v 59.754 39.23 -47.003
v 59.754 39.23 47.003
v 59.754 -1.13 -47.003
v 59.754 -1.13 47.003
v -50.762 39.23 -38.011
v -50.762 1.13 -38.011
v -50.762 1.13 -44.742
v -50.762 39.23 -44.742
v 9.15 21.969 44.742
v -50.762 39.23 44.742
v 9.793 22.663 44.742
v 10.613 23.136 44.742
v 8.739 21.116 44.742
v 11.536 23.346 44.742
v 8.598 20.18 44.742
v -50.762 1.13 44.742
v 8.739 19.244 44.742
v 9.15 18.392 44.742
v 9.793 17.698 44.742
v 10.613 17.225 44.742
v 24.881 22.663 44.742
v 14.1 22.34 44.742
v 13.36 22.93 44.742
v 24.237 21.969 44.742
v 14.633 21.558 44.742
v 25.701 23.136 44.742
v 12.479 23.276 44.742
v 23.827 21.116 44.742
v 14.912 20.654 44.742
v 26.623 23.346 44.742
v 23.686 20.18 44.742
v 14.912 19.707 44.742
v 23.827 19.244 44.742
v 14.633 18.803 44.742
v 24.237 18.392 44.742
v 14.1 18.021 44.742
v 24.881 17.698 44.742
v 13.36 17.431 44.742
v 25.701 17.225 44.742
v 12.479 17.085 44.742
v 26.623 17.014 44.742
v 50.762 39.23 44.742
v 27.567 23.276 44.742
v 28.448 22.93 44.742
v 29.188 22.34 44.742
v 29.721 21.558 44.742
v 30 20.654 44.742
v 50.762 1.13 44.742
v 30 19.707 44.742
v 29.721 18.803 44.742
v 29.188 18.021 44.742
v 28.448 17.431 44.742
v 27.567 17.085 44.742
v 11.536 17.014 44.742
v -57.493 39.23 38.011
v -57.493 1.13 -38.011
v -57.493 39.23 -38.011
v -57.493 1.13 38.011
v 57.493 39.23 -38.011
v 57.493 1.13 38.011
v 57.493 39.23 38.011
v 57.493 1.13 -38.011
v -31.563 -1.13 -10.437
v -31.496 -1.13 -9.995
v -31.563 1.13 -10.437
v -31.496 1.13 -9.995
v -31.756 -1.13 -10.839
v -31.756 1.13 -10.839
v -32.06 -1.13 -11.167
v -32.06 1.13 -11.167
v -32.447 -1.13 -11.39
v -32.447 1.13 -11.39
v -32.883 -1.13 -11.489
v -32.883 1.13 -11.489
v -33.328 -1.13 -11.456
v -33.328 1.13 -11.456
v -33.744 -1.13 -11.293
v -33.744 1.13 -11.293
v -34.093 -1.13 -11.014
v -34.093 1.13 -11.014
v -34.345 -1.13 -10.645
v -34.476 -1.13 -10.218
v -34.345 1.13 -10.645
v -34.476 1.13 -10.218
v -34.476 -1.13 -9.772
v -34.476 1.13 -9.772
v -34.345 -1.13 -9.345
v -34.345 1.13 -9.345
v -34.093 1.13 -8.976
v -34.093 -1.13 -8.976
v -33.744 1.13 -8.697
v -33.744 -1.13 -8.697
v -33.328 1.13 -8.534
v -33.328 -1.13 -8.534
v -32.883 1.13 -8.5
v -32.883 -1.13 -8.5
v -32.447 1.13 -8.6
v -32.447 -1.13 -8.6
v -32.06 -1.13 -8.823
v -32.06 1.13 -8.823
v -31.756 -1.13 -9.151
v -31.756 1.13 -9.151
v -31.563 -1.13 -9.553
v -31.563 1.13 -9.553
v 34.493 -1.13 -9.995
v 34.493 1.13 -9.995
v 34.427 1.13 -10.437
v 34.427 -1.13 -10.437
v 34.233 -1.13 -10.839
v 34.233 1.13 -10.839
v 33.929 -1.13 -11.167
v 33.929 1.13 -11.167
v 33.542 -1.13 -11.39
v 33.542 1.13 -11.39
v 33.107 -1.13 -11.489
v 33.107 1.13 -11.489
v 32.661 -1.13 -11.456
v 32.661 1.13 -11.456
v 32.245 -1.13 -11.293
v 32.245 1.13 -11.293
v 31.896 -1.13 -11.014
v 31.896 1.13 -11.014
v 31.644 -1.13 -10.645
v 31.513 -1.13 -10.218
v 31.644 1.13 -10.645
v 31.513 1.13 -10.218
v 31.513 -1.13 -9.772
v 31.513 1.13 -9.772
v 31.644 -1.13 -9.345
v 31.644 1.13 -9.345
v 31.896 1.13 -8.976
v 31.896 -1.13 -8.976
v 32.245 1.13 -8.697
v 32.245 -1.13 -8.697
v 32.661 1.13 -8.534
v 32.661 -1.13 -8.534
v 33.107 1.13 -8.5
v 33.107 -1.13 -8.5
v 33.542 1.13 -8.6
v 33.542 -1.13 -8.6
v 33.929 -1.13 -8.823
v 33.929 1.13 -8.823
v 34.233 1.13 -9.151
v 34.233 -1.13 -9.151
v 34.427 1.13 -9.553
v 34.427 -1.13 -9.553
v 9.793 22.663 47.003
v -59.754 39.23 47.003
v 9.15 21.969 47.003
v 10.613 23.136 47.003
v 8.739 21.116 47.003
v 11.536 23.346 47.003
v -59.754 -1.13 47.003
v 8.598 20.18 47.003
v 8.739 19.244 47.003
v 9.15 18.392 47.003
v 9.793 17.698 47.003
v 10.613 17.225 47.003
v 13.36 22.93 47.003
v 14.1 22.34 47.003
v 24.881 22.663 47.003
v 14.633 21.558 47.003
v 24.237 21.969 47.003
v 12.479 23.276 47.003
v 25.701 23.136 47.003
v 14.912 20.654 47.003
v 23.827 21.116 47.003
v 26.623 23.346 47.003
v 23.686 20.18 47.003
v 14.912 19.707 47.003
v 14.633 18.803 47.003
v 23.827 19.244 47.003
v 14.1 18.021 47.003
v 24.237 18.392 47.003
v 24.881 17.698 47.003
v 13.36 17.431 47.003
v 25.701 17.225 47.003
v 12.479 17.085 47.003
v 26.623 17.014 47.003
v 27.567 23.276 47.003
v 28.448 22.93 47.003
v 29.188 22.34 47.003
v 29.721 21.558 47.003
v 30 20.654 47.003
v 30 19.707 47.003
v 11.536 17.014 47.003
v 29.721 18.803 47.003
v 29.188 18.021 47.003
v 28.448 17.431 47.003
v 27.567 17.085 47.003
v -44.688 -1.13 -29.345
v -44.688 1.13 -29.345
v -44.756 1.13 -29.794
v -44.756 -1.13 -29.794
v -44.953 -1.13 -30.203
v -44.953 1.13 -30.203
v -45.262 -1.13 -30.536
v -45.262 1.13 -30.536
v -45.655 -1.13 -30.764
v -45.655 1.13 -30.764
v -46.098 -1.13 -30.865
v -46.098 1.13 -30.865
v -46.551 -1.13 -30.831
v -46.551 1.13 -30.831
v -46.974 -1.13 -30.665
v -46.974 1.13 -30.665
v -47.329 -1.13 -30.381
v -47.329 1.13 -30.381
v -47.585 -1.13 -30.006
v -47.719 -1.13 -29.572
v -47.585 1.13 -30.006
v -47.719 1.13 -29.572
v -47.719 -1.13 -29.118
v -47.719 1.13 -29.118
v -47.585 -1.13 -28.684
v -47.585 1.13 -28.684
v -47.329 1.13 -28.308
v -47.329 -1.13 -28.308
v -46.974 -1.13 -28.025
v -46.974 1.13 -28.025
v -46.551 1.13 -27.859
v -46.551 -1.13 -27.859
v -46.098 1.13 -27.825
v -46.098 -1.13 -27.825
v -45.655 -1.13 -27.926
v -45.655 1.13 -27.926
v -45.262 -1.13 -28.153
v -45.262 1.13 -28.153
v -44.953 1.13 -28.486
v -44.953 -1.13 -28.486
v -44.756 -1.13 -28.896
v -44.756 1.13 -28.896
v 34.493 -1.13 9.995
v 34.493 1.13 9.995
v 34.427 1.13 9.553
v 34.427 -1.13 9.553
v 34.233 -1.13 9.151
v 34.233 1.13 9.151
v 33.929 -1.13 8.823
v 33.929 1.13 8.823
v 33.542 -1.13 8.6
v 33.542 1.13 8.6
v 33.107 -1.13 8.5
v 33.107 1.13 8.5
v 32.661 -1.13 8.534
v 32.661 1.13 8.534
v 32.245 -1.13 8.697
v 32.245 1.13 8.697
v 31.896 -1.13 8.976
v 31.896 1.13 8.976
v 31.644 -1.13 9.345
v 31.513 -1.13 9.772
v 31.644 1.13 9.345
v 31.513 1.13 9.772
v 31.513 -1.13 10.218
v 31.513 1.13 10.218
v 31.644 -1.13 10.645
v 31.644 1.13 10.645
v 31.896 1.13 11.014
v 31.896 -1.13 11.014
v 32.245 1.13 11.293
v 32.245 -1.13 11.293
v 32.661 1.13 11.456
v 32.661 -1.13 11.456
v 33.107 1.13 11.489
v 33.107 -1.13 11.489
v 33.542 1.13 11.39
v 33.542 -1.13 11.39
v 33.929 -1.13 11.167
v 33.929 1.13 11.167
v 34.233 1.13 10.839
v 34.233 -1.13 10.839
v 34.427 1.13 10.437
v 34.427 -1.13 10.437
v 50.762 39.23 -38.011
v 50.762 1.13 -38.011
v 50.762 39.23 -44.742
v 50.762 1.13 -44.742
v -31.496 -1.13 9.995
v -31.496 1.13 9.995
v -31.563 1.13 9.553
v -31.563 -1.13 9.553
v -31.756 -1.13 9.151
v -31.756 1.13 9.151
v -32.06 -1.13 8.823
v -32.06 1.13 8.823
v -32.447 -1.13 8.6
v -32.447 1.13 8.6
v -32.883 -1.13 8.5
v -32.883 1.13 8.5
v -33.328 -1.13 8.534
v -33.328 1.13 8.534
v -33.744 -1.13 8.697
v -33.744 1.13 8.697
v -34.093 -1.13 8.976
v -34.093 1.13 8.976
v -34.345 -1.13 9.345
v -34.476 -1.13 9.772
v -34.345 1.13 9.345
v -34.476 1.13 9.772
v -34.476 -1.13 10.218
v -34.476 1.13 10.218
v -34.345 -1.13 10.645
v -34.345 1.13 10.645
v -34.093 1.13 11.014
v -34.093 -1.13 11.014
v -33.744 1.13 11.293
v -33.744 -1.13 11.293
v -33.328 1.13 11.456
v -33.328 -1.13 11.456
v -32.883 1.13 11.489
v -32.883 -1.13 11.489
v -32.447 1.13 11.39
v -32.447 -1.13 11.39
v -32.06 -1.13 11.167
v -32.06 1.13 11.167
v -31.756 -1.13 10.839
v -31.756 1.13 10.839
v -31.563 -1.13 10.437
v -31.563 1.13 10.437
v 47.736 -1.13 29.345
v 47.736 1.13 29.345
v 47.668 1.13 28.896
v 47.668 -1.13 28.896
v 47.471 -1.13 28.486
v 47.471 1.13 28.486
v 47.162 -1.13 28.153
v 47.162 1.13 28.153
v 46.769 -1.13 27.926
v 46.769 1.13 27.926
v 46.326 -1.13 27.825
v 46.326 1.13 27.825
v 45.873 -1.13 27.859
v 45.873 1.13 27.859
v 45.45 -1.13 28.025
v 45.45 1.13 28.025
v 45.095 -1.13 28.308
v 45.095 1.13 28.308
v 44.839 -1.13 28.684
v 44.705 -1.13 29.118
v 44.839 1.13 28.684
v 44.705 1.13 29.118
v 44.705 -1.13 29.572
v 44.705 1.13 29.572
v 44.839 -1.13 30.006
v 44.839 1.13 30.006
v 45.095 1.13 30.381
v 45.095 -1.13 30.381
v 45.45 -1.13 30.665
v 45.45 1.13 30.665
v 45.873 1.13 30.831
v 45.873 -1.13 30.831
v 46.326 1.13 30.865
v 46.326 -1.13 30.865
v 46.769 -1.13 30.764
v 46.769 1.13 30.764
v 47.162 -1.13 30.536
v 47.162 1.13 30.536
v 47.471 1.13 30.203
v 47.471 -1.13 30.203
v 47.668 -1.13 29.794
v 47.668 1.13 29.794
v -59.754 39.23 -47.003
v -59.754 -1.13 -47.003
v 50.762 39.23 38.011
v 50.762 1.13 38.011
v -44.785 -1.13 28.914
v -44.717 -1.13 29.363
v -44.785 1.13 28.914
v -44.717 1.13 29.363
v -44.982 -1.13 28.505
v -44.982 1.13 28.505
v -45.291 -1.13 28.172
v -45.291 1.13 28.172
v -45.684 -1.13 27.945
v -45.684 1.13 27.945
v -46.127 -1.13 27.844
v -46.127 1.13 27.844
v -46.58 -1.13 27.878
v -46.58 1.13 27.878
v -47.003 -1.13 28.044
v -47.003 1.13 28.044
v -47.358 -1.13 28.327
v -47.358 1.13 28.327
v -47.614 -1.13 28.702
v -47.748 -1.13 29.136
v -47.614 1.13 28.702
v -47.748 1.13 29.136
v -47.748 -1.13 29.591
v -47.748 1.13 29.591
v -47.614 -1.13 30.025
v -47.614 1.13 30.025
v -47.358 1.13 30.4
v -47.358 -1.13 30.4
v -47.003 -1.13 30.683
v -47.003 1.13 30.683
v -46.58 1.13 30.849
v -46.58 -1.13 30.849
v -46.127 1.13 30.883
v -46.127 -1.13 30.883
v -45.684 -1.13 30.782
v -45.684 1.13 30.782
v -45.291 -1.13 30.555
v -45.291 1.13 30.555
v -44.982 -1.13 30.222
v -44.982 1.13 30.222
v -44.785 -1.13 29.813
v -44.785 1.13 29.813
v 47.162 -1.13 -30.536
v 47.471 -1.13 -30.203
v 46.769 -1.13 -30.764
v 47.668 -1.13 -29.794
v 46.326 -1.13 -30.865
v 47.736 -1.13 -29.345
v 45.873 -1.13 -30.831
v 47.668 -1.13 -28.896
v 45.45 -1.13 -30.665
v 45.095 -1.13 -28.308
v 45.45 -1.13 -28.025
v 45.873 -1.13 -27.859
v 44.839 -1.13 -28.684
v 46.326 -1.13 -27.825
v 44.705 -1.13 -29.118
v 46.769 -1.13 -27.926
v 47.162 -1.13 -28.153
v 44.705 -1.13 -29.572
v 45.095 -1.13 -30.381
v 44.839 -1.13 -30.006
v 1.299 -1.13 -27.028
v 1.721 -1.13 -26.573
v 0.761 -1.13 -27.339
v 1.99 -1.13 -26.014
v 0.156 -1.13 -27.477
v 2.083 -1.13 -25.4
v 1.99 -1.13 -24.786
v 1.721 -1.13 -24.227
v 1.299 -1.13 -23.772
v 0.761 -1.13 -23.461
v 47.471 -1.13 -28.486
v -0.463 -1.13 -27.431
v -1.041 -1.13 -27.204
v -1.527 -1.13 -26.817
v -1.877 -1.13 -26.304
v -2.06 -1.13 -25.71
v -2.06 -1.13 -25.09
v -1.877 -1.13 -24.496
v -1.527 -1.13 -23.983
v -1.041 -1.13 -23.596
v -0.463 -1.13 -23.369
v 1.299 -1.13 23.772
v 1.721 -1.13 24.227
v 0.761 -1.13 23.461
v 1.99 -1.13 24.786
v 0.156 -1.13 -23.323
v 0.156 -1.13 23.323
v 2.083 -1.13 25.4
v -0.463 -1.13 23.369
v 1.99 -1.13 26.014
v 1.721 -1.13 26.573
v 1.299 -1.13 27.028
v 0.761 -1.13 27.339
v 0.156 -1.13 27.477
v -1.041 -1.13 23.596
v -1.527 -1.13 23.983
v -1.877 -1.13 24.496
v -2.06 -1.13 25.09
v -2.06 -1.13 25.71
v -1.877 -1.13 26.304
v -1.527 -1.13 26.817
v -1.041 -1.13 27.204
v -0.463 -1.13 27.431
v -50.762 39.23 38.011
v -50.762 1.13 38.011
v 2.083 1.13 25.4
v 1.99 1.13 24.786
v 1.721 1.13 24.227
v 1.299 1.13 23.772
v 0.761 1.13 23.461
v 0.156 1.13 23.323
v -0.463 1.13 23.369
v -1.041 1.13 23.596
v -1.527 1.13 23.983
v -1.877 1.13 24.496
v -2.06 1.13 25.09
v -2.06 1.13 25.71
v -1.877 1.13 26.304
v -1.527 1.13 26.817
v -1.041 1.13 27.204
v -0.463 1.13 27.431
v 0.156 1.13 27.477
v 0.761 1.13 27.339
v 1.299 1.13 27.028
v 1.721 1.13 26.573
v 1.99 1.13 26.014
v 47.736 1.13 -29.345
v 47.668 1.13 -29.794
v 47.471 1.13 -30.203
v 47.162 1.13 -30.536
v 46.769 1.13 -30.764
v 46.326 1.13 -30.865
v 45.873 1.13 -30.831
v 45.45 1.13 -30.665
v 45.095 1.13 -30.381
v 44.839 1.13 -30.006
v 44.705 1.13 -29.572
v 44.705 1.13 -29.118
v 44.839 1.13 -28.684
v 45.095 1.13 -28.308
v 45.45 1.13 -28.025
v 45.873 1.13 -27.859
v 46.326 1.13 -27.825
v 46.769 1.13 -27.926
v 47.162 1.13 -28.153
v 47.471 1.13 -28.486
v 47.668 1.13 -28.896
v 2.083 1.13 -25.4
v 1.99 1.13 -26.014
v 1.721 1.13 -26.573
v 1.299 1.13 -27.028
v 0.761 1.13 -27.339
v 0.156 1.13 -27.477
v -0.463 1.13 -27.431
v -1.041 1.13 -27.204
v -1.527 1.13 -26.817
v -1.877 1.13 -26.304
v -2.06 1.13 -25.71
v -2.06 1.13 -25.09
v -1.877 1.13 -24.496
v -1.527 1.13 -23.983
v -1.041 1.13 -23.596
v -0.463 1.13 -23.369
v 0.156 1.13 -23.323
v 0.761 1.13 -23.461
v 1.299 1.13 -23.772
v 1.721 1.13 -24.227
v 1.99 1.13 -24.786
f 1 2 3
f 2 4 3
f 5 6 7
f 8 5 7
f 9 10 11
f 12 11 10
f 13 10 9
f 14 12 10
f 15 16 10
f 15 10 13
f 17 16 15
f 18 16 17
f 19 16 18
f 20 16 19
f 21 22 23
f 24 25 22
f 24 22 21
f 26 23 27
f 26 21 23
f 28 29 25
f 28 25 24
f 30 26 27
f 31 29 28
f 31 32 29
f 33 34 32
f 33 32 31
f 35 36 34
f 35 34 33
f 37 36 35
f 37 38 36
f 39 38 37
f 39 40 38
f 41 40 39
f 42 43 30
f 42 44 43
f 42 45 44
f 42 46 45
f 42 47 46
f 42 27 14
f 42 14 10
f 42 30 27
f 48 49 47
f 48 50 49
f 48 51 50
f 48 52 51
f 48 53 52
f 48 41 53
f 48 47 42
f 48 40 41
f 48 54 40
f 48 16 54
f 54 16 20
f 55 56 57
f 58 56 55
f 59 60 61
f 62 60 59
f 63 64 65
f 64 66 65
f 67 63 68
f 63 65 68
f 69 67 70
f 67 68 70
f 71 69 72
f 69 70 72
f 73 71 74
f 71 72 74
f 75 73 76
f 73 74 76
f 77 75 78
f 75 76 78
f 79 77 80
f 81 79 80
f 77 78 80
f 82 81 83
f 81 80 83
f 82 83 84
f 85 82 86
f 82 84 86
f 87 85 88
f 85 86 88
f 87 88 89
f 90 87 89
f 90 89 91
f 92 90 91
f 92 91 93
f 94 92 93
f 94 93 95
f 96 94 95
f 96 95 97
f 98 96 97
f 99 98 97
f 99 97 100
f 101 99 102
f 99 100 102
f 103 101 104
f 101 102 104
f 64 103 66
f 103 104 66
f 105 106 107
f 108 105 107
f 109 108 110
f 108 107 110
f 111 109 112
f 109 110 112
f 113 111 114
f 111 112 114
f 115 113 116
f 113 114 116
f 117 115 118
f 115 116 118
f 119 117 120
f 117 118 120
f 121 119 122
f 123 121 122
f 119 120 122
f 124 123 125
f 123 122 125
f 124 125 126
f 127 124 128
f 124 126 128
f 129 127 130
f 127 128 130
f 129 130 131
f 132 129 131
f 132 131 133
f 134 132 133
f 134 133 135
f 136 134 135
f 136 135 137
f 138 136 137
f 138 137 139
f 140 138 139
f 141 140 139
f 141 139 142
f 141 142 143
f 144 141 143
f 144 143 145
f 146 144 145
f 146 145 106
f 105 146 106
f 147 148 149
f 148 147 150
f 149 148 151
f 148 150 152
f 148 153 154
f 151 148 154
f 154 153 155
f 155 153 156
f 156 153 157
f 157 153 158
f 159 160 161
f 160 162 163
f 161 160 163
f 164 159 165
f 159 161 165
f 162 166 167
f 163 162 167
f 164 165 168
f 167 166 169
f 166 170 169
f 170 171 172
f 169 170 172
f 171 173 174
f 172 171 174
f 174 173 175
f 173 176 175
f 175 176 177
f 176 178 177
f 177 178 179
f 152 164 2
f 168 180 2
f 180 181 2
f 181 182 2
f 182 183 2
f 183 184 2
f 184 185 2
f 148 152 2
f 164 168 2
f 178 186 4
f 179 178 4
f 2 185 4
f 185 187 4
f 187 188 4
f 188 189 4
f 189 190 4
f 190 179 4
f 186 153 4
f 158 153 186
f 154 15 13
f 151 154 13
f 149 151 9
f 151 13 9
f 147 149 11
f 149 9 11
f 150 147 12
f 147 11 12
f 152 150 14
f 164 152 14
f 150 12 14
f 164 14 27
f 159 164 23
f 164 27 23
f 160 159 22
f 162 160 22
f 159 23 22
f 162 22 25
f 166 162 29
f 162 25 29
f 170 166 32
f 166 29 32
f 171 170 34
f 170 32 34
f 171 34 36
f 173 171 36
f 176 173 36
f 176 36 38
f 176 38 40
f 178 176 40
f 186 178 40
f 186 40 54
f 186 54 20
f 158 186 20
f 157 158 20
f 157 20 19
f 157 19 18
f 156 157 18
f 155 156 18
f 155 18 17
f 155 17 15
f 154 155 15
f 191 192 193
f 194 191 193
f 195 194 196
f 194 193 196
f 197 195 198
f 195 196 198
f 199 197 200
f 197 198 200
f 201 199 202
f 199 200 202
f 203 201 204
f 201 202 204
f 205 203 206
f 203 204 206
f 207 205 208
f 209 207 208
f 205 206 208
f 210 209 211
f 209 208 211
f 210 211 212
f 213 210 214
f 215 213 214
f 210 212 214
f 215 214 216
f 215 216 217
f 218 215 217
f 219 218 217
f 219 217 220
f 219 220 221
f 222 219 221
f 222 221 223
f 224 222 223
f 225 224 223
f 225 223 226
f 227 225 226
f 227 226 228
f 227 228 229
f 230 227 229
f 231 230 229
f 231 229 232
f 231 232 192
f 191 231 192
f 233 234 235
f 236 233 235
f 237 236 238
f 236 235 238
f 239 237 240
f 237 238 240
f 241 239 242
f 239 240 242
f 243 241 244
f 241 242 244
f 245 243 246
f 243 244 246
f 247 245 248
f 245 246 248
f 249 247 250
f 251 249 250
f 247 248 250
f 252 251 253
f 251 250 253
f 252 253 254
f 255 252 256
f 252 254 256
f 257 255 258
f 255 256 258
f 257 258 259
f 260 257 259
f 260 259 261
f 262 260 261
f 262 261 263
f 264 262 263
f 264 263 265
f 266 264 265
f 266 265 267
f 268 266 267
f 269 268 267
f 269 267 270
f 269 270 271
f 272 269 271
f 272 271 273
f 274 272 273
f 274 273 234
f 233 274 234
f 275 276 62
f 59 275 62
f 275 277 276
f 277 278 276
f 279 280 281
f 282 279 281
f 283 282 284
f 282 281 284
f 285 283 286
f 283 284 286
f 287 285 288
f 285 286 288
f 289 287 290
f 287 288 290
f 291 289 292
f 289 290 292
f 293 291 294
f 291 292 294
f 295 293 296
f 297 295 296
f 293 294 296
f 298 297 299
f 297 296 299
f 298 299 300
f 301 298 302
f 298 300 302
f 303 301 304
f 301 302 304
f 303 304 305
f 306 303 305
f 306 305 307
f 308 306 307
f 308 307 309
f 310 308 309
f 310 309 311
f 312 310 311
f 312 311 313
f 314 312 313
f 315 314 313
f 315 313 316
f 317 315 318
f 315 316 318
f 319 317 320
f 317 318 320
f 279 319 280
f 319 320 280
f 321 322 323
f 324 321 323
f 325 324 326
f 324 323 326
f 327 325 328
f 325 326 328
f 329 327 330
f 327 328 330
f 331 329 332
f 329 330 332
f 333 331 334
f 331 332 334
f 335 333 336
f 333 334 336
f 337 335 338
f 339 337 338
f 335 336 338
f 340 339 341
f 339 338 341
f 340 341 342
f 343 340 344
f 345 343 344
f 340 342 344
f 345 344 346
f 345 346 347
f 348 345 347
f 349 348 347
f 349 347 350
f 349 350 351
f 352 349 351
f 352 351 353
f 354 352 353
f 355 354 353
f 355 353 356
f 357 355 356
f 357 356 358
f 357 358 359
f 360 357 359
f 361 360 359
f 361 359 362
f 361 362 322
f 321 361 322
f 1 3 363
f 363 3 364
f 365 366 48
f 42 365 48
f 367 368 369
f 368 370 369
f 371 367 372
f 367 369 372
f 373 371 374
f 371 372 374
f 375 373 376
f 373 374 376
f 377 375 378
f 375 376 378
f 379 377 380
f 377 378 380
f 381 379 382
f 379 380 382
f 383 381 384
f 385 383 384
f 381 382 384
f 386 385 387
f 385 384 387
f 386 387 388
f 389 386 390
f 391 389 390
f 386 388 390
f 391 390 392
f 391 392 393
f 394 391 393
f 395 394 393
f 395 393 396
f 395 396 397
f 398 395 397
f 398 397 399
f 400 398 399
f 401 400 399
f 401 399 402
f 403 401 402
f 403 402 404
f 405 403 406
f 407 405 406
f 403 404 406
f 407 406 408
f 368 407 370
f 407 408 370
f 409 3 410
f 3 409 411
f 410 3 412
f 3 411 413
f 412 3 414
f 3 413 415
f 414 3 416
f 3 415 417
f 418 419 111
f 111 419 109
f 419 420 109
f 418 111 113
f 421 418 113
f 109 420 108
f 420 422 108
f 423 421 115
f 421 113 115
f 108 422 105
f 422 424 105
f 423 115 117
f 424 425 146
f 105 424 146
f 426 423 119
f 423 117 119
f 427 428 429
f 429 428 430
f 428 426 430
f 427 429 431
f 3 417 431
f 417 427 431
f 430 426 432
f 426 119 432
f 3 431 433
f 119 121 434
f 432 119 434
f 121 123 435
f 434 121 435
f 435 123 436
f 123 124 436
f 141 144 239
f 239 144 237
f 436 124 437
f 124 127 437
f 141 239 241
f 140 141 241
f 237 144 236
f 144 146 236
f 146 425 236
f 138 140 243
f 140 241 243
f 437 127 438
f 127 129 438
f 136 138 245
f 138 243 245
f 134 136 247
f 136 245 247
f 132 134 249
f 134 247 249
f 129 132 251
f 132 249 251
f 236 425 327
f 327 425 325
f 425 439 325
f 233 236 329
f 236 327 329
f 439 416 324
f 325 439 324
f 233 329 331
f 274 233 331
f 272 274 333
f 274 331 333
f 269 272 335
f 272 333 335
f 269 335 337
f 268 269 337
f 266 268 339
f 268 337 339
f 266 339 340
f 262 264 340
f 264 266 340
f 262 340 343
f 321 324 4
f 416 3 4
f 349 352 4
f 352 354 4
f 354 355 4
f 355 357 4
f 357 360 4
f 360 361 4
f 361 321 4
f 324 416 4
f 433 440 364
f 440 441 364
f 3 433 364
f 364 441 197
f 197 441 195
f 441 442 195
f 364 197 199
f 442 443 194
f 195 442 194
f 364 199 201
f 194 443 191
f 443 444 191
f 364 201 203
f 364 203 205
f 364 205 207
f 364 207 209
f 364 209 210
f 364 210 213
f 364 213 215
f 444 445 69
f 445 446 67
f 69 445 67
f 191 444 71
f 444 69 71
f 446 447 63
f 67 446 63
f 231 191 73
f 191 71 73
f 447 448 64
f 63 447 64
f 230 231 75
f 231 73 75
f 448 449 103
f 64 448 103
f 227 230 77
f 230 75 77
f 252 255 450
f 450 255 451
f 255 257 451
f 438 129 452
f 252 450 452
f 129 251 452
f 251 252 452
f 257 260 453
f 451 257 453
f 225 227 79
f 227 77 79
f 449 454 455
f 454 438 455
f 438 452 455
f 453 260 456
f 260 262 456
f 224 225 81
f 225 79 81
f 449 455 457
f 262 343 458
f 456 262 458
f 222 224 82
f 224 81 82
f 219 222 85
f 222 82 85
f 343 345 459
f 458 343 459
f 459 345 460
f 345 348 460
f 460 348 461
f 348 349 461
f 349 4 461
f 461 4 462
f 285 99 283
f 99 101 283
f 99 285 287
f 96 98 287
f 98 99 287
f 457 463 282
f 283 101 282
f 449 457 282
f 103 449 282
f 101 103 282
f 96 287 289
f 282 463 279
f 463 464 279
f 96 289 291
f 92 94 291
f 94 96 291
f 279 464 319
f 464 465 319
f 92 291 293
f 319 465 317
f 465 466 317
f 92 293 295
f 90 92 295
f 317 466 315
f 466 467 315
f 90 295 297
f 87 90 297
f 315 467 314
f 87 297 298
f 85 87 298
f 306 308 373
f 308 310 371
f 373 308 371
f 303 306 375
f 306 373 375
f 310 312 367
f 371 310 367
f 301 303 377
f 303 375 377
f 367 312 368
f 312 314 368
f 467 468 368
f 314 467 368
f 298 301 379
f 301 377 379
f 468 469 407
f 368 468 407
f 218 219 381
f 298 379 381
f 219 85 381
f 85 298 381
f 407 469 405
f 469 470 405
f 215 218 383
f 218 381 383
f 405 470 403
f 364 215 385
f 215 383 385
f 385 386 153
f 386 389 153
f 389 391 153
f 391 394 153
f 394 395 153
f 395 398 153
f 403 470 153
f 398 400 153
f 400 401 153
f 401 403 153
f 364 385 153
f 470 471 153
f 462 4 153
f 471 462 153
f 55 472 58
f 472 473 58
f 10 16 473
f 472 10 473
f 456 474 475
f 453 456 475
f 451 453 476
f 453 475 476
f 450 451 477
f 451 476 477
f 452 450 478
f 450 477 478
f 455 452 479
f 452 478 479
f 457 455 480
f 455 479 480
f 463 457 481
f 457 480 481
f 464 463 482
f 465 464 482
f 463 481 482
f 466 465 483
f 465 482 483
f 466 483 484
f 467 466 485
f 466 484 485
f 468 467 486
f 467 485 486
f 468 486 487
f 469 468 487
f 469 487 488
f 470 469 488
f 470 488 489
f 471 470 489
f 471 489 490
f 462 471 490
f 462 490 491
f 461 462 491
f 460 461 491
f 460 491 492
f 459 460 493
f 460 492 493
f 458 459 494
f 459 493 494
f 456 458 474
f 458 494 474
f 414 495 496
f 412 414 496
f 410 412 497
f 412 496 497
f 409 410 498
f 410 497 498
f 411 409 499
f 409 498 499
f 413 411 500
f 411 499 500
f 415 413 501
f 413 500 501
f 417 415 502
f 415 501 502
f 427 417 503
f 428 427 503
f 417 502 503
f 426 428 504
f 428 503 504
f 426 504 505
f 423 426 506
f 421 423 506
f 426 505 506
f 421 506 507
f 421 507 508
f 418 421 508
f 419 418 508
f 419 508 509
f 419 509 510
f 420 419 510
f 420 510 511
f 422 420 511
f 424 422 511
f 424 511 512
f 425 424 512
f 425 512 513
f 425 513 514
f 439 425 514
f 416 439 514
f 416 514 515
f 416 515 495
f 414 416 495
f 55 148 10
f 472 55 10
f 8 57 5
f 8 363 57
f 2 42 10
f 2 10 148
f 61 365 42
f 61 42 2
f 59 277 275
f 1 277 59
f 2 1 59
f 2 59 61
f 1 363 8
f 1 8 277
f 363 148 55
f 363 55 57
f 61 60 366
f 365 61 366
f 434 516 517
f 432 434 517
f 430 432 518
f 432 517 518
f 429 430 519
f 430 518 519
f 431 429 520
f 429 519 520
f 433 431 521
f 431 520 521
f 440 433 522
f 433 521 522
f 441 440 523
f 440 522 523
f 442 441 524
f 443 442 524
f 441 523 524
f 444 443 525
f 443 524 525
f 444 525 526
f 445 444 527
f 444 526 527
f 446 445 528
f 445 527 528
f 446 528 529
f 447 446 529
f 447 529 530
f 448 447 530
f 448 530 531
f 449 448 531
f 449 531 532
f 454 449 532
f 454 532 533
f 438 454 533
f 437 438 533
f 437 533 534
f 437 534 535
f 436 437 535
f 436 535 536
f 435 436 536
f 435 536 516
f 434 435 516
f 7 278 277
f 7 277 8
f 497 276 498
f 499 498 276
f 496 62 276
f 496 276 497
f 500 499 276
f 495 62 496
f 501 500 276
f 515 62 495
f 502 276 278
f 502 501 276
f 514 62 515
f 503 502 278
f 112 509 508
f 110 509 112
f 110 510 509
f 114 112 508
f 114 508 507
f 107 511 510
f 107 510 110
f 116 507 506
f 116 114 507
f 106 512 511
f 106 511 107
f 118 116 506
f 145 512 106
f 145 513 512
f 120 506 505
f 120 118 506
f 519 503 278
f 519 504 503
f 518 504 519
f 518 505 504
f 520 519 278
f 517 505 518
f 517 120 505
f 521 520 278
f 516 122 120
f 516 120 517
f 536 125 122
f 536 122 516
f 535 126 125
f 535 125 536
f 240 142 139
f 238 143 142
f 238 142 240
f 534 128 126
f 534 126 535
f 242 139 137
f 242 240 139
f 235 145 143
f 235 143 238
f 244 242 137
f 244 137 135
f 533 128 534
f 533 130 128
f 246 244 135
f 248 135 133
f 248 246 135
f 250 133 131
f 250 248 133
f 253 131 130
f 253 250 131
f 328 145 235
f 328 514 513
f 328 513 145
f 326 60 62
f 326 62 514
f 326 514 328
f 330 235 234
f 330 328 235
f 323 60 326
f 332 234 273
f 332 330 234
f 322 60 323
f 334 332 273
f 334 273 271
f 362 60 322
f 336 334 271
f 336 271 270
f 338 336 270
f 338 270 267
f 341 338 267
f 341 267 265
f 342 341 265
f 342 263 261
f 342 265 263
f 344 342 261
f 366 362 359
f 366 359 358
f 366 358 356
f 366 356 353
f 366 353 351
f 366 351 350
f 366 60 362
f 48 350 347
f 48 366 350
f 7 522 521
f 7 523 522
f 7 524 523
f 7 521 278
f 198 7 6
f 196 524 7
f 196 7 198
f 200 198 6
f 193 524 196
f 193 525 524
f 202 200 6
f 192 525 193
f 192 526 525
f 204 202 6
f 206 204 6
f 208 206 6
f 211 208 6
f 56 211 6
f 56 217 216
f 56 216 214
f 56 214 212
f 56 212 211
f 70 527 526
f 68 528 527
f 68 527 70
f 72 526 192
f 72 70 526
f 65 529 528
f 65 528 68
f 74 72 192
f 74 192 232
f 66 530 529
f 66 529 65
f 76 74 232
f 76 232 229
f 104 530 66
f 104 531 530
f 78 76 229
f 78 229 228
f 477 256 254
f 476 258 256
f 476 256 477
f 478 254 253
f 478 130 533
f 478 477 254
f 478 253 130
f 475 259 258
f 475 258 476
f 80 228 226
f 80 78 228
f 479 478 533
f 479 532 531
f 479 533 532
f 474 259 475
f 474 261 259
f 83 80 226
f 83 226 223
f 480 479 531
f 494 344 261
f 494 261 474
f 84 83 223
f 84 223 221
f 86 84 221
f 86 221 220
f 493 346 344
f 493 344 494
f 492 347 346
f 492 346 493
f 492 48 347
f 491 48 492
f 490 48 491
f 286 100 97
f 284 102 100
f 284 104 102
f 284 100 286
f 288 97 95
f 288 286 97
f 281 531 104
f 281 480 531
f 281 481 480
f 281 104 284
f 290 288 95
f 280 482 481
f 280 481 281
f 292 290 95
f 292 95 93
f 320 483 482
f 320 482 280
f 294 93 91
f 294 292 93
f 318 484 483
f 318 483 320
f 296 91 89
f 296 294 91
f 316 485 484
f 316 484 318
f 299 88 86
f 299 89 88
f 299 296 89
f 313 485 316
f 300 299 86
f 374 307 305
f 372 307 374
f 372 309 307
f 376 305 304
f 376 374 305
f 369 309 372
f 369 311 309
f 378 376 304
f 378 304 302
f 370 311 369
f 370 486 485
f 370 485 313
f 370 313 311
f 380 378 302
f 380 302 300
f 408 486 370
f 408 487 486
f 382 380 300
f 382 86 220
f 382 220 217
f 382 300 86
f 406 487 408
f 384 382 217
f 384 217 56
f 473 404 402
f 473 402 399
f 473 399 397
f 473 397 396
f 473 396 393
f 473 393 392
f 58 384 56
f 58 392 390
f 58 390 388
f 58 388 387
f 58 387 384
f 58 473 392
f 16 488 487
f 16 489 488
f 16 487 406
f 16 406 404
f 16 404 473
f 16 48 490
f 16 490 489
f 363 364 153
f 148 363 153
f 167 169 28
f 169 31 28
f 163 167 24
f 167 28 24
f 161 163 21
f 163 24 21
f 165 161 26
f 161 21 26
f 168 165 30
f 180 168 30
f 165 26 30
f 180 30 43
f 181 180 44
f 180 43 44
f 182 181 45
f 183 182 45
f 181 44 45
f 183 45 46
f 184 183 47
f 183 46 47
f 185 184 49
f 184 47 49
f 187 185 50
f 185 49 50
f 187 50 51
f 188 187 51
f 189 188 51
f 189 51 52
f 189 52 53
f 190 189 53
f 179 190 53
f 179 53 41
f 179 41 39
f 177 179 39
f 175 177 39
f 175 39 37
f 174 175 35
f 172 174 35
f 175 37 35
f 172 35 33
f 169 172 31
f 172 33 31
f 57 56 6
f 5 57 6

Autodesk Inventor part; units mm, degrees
ref_plane "YZ Plane" through (0, 0, 0) normal (1, 0, 0) x (0, 1, 0)
ref_plane "XZ Plane" through (0, 0, 0) normal (0, 1, 0) x (-1, 0, 0)
ref_plane "XY Plane" through (0, 0, 0) normal (0, 0, 1) x (1, 0, 0)
sketch "Sketch1" plane through (0, 0, 0) normal (0, 1, 0) x (-1, 0, 0)
  line L0 (-59.7535, -47.0027) -> (59.7535, -47.0027)
  line L1 (59.7535, -47.0027) -> (59.7535, 47.0027)
  line L2 (59.7535, 47.0027) -> (-59.7535, 47.0027)
  line L3 (-59.7535, 47.0027) -> (-59.7535, -47.0027)
  line L4 (-59.7535, -47.0027) -> (59.7535, 47.0027) construction
  line L5 (59.7535, -47.0027) -> (-59.7535, 47.0027) construction
  point P0 (0, 0)
  dimension "d0" = 119.507
  dimension "d1" = 94.0054
extrude "Extrusion1" add sketch "Sketch1" along normal mid plane 2.2606
sketch "Sketch2" plane through (0, 1.1303, 0) normal (0, 1, 0) x (1, 0, 0)
  line L0 (-59.7535, 47.0027) -> (-59.7535, -47.0027) projected
  line L1 (59.7535, -47.0027) -> (59.7535, 47.0027) projected
  line L2 (-59.7535, -47.0027) -> (59.7535, -47.0027)
  line L3 (59.7535, -47.0027) -> (59.7535, 47.0027)
  line L4 (59.7535, 47.0027) -> (-59.7535, 47.0027)
  line L5 (-59.7535, 47.0027) -> (-59.7535, -47.0027)
  line L6 (57.4929, -44.7421) -> (-57.4929, 44.7421) construction
  line L7 (-57.4929, -44.7421) -> (57.4929, 44.7421) construction
  line L8 (-59.7535, -47.0027) -> (59.7535, -47.0027) projected
  line L9 (-59.7535, -47.0027) -> (-50.7619, -47.0027)
  line L10 (-59.7535, -38.0111) -> (-59.7535, -47.0027)
  line L11 (-59.7535, 47.0027) -> (-50.7619, 47.0027)
  line L12 (-59.7535, 38.0111) -> (-59.7535, 47.0027)
  line L13 (59.7535, 47.0027) -> (-59.7535, 47.0027) projected
  line L14 (59.7535, 47.0027) -> (50.7619, 47.0027)
  line L15 (59.7535, 38.0111) -> (59.7535, 47.0027)
  line L16 (59.7535, -47.0027) -> (50.7619, -47.0027)
  line L17 (59.7535, -38.0111) -> (59.7535, -47.0027)
  line L18 (-50.7619, -44.7421) -> (-50.7619, -38.0111)
  line L19 (-50.7619, -38.0111) -> (-57.4929, -38.0111)
  line L20 (-57.4929, 38.0111) -> (-50.7619, 38.0111)
  line L21 (-50.7619, 38.0111) -> (-50.7619, 44.7421)
  line L22 (50.7619, 38.0111) -> (57.4929, 38.0111)
  line L23 (50.7619, 44.7421) -> (50.7619, 38.0111)
  line L24 (57.4929, -38.0111) -> (50.7619, -38.0111)
  line L25 (50.7619, -38.0111) -> (50.7619, -44.7421)
  line L26 (-50.7619, -44.7421) -> (50.7619, -44.7421)
  line L27 (57.4929, -38.0111) -> (57.4929, 38.0111)
  line L28 (50.7619, 44.7421) -> (-50.7619, 44.7421)
  line L29 (-57.4929, 38.0111) -> (-57.4929, -38.0111)
  point P0 (0, 0)
  dimension "d4" = 114.9858
  dimension "d5" = 89.4842
  dimension "d6" = 8.9916
  dimension "d7" = 8.9916
  dimension "d10" = 8.9916
  dimension "d11" = 8.9916
extrude "Extrusion2" add sketch "Sketch2" along normal blind 38.1
sketch "Sketch3" plane through (0, 1.1303, 0) normal (0, 1, 0) x (1, 0, 0)
  circle A0 centre (0, -25.4) radius 2.0828
  circle A1 centre (0, 25.4) radius 2.0828
  point P0 (0, 0)
  dimension "d18" = 4.1656
  dimension "d19" = 4.1656
extrude "Extrusion3" cut sketch "Sketch3" against normal through all
sketch "Sketch7" plane through (0, 1.1303, 0) normal (0, 1, 0) x (1, 0, 0)
  line L0 (32.9946, -9.9949) -> (-32.9946, 9.9949) construction
  line L1 (-32.9946, -9.9949) -> (32.9946, 9.9949) construction
  circle A0 centre (-32.9946, -9.9949) radius 1.4986
  circle A1 centre (-32.9946, 9.9949) radius 1.4986
  circle A2 centre (32.9946, 9.9949) radius 1.4986
  circle A3 centre (32.9946, -9.9949) radius 1.4986
  line L2 (47.498, -29.9974) -> (-47.498, 29.9974) construction
  line L3 (-47.498, -29.9974) -> (47.498, 29.9974) construction
  line L4 (-47.498, 29.9974) -> (-41.148, 29.9974) construction
  line L5 (47.498, 29.9974) -> (53.848, 29.9974) construction
  line L6 (47.2281, 30.3609) -> (-47.2281, 30.3609)
  line L7 (-47.2281, -30.3609) -> (47.2281, -30.3609)
  line L8 (47.2281, -30.3609) -> (47.2281, 30.3609)
  line L9 (47.2281, 30.3609) -> (-47.2281, -30.3609) construction
  line L10 (-47.2281, 30.3609) -> (47.2281, -30.3609) construction
  line L11 (-47.2568, -30.3794) -> (-46.2408, -30.3794)
  line L12 (-46.2408, -29.3634) -> (-47.2568, -29.3634)
  line L13 (-47.2568, -29.3634) -> (-47.2568, -30.3794)
  line L14 (-47.2281, 30.3609) -> (-46.2121, 30.3609)
  line L15 (-46.2121, 29.3449) -> (-47.2281, 29.3449)
  line L16 (-47.2281, 29.3449) -> (-47.2281, 30.3609)
  line L17 (47.2281, 30.3609) -> (46.2121, 30.3609)
  line L18 (46.2121, 29.3449) -> (47.2281, 29.3449)
  line L19 (47.2281, 29.3449) -> (47.2281, 30.3609)
  line L20 (47.2281, -30.3609) -> (46.2121, -30.3609)
  line L21 (46.2121, -29.3449) -> (47.2281, -29.3449)
  line L22 (47.2281, -29.3449) -> (47.2281, -30.3609)
  circle A4 centre (46.2121, -29.3449) radius 1.524
  circle A5 centre (46.2121, 29.3449) radius 1.524
  circle A6 centre (-46.2121, 29.3449) radius 1.524
  circle A7 centre (-46.2408, -29.3634) radius 1.524
  point P0 (0, 0)
  dimension "d48" = 19.9898
  dimension "d49" = 2.9972
  dimension "d50" = 2.9972
  dimension "d51" = 2.9972
  dimension "d52" = 2.9972
  dimension "d78" = 94.4562
  dimension "d79" = 60.7219
  dimension "d80" = 1.016
  dimension "d81" = 1.016
  dimension "d82" = 1.016
  dimension "d83" = 1.016
  dimension "d84" = 1.016
  dimension "d85" = 1.016
  dimension "d86" = 1.016
  dimension "d87" = 1.016
  dimension "d88" = 3.048
  dimension "d89" = 3.048
  dimension "d90" = 3.048
  dimension "d91" = 3.048
sketch "Sketch8" plane through (50.7619, 1.1303, 44.7421) normal (0, 0, -1) x (-1, 0, 0)
  circle A0 centre (23.9014, 19.05) radius 3.175
  circle A1 centre (38.989, 19.05) radius 3.175
  point P0 (50.7619, -1.1303)
  dimension "d74" = 6.35
  dimension "d75" = 6.35
extrude "Extrusion7" cut sketch "Sketch8" against normal through all
extrude "Extrusion8" cut sketch "Sketch7" against normal through all
properties part number "546-1590BBS-ADF4360-9"
